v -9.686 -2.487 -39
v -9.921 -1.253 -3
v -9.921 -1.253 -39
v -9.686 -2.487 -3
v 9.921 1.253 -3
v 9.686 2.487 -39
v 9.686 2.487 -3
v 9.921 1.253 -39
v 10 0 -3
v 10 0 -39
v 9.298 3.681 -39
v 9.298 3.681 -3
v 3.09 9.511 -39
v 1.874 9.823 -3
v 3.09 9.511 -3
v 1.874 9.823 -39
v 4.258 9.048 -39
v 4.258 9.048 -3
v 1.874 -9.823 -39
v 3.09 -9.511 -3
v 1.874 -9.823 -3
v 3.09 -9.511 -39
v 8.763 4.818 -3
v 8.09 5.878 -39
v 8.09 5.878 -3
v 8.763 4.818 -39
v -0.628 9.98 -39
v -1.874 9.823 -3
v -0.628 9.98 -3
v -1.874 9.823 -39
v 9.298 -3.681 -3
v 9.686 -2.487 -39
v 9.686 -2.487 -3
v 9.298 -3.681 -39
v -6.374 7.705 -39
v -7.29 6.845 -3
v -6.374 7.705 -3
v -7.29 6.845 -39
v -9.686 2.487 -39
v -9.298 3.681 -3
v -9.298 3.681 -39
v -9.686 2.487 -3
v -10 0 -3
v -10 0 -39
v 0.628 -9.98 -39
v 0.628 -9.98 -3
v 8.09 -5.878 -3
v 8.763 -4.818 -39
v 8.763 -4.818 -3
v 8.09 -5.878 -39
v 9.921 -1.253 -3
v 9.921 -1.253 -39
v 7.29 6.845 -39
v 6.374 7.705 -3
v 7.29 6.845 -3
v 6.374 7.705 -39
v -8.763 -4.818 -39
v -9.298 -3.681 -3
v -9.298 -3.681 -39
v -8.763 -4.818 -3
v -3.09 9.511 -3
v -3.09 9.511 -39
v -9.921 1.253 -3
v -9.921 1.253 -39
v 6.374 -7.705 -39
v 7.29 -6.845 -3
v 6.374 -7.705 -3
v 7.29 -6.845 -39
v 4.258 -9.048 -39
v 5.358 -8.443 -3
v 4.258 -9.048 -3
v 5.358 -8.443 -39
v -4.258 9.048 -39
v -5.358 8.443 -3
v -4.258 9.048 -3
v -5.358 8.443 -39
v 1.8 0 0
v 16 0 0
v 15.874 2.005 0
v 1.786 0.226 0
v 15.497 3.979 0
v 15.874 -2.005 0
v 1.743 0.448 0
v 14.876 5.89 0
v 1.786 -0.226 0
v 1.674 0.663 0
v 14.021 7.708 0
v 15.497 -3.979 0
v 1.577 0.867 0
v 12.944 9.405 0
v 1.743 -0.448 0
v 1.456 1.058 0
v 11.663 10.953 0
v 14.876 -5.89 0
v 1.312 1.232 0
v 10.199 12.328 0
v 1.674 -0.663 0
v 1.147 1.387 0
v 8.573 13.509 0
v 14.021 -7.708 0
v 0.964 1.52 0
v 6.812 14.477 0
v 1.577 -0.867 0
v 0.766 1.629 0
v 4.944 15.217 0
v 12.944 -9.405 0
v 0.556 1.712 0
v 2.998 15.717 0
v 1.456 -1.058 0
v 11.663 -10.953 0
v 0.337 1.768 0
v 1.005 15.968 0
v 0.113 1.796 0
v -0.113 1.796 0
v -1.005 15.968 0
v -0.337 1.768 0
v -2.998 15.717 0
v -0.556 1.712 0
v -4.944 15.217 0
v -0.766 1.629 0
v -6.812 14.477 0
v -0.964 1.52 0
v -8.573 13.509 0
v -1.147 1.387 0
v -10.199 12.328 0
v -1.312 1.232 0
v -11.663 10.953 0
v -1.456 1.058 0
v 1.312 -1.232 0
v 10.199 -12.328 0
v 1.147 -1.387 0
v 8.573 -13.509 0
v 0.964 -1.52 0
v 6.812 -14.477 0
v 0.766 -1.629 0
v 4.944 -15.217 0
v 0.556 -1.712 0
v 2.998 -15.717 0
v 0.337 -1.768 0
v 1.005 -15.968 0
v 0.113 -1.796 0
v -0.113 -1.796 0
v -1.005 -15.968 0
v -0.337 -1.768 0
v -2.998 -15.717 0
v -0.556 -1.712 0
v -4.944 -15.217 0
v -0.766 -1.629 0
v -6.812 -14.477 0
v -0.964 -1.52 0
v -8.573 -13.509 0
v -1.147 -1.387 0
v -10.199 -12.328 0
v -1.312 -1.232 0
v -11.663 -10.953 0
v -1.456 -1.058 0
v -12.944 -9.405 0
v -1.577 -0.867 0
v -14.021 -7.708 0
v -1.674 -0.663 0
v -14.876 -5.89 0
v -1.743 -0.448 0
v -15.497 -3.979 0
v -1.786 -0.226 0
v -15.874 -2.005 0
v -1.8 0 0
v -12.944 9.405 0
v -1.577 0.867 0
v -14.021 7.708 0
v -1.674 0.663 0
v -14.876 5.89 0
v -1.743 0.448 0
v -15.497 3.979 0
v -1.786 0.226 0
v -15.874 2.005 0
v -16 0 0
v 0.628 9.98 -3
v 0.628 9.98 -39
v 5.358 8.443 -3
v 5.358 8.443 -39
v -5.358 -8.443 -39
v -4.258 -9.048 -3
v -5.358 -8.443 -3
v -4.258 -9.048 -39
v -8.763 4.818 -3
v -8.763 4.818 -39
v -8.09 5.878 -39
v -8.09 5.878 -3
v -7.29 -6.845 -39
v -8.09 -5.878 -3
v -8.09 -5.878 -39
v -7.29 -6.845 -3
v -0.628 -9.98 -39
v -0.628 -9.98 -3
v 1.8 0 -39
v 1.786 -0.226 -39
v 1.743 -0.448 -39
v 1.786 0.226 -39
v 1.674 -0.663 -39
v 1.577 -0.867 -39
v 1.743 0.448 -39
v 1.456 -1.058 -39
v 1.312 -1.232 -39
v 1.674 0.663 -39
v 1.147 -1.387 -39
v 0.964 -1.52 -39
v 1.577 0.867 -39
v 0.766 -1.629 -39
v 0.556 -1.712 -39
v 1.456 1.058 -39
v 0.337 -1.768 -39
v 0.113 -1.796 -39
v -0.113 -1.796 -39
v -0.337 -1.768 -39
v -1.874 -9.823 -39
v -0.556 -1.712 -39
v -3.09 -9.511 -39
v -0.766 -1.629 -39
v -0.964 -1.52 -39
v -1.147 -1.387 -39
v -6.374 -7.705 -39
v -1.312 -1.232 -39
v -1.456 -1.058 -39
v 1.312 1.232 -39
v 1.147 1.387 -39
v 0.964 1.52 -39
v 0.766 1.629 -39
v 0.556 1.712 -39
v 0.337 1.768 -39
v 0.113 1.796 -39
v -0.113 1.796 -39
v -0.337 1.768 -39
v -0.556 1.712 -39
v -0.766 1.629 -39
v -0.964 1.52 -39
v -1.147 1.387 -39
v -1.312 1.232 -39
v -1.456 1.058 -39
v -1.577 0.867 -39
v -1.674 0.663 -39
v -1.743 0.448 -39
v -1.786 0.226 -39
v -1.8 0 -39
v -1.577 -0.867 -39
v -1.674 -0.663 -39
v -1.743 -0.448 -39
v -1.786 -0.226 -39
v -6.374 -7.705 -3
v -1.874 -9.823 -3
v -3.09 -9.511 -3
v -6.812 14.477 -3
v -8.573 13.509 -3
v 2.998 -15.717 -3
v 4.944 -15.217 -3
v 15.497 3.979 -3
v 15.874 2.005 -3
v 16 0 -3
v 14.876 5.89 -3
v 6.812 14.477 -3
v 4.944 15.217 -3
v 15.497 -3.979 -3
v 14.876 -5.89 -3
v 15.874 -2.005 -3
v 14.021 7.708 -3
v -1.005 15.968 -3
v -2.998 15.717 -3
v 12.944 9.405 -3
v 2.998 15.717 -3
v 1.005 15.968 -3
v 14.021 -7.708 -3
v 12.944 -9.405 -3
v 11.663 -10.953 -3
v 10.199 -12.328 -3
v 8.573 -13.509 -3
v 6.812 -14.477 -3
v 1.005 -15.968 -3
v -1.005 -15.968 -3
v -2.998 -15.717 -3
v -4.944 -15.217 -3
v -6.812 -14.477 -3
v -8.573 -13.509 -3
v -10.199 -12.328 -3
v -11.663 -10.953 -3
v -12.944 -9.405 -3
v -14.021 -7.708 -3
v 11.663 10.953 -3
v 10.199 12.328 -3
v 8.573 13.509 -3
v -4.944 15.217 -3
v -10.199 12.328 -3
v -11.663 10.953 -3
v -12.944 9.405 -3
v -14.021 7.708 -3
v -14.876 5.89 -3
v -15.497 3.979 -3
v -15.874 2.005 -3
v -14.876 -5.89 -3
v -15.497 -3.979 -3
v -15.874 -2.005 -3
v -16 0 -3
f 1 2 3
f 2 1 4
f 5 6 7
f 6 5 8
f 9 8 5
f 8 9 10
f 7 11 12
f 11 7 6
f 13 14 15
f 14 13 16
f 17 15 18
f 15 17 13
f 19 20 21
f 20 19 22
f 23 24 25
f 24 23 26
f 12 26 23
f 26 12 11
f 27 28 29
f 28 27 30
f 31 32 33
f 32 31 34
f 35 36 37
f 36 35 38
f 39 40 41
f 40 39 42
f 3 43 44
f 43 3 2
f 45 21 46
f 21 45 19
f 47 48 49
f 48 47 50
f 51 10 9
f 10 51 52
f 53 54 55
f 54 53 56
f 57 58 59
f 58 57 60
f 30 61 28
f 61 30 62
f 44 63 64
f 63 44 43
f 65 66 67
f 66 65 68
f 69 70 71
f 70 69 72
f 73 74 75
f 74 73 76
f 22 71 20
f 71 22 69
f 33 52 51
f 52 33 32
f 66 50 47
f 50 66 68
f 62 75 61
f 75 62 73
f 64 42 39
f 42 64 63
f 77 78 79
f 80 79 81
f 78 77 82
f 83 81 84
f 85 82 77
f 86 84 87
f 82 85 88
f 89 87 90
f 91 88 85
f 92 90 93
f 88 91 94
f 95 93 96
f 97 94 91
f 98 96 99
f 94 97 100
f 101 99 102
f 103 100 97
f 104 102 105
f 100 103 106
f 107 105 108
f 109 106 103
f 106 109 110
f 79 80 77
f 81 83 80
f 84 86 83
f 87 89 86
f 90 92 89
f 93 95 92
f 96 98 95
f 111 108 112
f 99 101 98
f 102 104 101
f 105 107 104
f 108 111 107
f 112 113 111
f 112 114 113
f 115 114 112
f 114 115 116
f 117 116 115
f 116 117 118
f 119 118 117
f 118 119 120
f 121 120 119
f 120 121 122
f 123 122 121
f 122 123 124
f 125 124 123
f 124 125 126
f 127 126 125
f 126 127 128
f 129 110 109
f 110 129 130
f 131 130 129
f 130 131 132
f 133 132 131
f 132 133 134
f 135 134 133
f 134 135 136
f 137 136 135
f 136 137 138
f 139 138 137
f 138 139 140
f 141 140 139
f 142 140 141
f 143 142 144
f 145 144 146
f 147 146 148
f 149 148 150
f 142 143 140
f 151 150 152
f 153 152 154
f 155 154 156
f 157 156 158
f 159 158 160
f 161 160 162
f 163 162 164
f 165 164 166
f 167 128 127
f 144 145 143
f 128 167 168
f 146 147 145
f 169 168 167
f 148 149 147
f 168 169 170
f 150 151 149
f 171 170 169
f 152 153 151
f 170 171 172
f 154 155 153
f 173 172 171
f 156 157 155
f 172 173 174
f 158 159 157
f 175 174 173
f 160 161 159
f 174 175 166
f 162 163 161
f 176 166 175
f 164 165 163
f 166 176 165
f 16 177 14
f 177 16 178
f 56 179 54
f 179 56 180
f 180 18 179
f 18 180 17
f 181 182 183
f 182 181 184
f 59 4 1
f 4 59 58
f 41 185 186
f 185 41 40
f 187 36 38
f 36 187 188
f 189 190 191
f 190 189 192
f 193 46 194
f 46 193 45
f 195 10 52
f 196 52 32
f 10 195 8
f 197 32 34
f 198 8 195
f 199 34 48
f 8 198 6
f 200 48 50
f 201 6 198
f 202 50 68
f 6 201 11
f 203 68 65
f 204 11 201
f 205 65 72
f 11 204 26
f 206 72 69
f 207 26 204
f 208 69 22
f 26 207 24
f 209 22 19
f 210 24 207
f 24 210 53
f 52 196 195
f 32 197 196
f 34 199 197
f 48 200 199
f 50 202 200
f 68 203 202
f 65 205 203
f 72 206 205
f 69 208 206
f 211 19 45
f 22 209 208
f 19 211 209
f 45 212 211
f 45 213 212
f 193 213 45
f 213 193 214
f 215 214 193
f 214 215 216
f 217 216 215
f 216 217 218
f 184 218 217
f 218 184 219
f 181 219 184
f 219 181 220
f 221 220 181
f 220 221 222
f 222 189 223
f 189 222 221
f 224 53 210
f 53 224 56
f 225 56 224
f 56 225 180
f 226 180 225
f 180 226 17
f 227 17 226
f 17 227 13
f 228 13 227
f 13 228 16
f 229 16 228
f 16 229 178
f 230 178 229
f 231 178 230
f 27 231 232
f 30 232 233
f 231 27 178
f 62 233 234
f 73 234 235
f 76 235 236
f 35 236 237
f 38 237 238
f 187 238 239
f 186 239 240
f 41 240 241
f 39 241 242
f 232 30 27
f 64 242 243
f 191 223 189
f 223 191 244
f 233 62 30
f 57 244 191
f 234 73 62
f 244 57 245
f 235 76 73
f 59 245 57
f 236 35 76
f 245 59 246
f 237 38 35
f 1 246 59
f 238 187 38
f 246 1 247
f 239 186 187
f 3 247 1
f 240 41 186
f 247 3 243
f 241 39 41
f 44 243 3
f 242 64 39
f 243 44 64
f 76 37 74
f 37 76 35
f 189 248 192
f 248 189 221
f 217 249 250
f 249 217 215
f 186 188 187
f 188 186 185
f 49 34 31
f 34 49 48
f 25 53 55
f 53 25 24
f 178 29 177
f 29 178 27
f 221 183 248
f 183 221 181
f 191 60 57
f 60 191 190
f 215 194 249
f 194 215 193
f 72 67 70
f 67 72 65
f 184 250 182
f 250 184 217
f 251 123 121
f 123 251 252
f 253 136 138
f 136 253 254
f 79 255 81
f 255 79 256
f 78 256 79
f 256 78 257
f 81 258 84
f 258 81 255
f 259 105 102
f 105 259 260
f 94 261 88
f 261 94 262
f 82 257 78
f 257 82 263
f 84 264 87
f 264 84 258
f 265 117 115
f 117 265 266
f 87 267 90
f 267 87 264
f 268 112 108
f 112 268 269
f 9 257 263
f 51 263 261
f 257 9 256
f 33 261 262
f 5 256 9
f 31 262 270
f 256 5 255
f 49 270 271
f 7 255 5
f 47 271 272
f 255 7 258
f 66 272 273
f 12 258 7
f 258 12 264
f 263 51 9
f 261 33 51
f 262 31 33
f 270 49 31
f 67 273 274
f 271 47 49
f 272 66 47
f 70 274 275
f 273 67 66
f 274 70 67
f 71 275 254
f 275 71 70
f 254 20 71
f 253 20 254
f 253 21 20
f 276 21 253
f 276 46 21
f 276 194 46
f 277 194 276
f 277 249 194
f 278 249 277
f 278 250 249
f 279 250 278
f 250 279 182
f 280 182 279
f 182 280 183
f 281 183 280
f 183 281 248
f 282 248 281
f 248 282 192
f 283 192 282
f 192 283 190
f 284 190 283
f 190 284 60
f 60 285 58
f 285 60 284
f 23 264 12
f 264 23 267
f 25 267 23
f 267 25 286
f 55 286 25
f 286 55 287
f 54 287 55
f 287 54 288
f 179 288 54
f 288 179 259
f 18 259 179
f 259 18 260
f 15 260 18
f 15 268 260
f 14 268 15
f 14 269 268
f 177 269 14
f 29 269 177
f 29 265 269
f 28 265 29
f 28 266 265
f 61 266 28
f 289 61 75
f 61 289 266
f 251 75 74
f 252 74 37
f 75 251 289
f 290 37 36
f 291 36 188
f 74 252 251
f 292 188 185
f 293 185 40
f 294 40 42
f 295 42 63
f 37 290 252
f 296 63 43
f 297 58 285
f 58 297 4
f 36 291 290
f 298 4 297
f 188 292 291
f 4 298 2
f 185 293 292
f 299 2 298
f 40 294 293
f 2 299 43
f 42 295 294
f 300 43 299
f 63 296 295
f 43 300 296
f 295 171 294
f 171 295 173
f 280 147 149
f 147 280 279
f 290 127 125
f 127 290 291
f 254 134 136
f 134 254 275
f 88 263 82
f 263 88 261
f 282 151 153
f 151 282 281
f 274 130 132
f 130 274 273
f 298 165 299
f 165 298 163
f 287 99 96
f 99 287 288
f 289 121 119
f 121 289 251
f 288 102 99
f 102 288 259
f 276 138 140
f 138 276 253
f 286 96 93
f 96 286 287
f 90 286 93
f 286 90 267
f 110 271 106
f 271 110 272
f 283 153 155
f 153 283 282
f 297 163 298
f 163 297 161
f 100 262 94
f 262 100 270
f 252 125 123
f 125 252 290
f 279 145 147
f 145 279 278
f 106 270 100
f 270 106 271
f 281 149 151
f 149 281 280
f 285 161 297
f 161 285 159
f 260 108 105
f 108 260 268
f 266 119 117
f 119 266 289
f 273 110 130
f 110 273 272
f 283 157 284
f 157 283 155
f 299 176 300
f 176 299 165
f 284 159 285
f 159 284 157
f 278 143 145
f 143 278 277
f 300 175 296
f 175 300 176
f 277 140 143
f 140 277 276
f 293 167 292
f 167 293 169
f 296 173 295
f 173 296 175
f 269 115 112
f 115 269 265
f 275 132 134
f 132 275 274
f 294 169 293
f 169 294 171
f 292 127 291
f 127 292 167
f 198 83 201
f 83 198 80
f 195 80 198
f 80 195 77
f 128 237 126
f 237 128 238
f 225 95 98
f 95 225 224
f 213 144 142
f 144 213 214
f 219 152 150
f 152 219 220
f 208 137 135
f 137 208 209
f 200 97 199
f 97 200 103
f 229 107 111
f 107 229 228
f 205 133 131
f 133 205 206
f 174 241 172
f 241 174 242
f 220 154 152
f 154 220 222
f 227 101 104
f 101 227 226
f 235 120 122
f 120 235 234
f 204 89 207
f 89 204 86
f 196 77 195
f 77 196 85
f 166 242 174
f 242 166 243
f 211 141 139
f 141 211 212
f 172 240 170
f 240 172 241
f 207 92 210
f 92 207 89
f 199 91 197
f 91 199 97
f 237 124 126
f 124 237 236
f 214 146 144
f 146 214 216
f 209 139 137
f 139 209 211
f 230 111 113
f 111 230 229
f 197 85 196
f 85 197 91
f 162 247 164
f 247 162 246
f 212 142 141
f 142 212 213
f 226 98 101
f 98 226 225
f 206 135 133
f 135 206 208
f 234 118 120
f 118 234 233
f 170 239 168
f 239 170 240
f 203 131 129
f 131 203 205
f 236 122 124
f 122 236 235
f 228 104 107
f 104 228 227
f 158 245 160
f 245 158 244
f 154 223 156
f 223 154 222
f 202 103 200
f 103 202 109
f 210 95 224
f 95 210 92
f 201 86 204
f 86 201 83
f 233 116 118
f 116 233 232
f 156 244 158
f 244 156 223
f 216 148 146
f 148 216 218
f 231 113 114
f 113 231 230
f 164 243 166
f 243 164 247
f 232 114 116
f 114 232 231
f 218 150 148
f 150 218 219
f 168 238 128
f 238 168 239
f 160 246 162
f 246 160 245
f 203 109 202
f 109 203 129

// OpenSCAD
$fn = 50;


difference() {
	union() {
		translate(v = [0, 0, -39.0000000000]) {
			cylinder(h = 39, r = 10.0000000000);
		}
		translate(v = [0, 0, -3.0000000000]) {
			cylinder(h = 3, r = 16.0000000000);
		}
	}
	union() {
		#translate(v = [0, 0, -39]) {
			cylinder(h = 39, r = 1.8000000000);
		}
	}
}
